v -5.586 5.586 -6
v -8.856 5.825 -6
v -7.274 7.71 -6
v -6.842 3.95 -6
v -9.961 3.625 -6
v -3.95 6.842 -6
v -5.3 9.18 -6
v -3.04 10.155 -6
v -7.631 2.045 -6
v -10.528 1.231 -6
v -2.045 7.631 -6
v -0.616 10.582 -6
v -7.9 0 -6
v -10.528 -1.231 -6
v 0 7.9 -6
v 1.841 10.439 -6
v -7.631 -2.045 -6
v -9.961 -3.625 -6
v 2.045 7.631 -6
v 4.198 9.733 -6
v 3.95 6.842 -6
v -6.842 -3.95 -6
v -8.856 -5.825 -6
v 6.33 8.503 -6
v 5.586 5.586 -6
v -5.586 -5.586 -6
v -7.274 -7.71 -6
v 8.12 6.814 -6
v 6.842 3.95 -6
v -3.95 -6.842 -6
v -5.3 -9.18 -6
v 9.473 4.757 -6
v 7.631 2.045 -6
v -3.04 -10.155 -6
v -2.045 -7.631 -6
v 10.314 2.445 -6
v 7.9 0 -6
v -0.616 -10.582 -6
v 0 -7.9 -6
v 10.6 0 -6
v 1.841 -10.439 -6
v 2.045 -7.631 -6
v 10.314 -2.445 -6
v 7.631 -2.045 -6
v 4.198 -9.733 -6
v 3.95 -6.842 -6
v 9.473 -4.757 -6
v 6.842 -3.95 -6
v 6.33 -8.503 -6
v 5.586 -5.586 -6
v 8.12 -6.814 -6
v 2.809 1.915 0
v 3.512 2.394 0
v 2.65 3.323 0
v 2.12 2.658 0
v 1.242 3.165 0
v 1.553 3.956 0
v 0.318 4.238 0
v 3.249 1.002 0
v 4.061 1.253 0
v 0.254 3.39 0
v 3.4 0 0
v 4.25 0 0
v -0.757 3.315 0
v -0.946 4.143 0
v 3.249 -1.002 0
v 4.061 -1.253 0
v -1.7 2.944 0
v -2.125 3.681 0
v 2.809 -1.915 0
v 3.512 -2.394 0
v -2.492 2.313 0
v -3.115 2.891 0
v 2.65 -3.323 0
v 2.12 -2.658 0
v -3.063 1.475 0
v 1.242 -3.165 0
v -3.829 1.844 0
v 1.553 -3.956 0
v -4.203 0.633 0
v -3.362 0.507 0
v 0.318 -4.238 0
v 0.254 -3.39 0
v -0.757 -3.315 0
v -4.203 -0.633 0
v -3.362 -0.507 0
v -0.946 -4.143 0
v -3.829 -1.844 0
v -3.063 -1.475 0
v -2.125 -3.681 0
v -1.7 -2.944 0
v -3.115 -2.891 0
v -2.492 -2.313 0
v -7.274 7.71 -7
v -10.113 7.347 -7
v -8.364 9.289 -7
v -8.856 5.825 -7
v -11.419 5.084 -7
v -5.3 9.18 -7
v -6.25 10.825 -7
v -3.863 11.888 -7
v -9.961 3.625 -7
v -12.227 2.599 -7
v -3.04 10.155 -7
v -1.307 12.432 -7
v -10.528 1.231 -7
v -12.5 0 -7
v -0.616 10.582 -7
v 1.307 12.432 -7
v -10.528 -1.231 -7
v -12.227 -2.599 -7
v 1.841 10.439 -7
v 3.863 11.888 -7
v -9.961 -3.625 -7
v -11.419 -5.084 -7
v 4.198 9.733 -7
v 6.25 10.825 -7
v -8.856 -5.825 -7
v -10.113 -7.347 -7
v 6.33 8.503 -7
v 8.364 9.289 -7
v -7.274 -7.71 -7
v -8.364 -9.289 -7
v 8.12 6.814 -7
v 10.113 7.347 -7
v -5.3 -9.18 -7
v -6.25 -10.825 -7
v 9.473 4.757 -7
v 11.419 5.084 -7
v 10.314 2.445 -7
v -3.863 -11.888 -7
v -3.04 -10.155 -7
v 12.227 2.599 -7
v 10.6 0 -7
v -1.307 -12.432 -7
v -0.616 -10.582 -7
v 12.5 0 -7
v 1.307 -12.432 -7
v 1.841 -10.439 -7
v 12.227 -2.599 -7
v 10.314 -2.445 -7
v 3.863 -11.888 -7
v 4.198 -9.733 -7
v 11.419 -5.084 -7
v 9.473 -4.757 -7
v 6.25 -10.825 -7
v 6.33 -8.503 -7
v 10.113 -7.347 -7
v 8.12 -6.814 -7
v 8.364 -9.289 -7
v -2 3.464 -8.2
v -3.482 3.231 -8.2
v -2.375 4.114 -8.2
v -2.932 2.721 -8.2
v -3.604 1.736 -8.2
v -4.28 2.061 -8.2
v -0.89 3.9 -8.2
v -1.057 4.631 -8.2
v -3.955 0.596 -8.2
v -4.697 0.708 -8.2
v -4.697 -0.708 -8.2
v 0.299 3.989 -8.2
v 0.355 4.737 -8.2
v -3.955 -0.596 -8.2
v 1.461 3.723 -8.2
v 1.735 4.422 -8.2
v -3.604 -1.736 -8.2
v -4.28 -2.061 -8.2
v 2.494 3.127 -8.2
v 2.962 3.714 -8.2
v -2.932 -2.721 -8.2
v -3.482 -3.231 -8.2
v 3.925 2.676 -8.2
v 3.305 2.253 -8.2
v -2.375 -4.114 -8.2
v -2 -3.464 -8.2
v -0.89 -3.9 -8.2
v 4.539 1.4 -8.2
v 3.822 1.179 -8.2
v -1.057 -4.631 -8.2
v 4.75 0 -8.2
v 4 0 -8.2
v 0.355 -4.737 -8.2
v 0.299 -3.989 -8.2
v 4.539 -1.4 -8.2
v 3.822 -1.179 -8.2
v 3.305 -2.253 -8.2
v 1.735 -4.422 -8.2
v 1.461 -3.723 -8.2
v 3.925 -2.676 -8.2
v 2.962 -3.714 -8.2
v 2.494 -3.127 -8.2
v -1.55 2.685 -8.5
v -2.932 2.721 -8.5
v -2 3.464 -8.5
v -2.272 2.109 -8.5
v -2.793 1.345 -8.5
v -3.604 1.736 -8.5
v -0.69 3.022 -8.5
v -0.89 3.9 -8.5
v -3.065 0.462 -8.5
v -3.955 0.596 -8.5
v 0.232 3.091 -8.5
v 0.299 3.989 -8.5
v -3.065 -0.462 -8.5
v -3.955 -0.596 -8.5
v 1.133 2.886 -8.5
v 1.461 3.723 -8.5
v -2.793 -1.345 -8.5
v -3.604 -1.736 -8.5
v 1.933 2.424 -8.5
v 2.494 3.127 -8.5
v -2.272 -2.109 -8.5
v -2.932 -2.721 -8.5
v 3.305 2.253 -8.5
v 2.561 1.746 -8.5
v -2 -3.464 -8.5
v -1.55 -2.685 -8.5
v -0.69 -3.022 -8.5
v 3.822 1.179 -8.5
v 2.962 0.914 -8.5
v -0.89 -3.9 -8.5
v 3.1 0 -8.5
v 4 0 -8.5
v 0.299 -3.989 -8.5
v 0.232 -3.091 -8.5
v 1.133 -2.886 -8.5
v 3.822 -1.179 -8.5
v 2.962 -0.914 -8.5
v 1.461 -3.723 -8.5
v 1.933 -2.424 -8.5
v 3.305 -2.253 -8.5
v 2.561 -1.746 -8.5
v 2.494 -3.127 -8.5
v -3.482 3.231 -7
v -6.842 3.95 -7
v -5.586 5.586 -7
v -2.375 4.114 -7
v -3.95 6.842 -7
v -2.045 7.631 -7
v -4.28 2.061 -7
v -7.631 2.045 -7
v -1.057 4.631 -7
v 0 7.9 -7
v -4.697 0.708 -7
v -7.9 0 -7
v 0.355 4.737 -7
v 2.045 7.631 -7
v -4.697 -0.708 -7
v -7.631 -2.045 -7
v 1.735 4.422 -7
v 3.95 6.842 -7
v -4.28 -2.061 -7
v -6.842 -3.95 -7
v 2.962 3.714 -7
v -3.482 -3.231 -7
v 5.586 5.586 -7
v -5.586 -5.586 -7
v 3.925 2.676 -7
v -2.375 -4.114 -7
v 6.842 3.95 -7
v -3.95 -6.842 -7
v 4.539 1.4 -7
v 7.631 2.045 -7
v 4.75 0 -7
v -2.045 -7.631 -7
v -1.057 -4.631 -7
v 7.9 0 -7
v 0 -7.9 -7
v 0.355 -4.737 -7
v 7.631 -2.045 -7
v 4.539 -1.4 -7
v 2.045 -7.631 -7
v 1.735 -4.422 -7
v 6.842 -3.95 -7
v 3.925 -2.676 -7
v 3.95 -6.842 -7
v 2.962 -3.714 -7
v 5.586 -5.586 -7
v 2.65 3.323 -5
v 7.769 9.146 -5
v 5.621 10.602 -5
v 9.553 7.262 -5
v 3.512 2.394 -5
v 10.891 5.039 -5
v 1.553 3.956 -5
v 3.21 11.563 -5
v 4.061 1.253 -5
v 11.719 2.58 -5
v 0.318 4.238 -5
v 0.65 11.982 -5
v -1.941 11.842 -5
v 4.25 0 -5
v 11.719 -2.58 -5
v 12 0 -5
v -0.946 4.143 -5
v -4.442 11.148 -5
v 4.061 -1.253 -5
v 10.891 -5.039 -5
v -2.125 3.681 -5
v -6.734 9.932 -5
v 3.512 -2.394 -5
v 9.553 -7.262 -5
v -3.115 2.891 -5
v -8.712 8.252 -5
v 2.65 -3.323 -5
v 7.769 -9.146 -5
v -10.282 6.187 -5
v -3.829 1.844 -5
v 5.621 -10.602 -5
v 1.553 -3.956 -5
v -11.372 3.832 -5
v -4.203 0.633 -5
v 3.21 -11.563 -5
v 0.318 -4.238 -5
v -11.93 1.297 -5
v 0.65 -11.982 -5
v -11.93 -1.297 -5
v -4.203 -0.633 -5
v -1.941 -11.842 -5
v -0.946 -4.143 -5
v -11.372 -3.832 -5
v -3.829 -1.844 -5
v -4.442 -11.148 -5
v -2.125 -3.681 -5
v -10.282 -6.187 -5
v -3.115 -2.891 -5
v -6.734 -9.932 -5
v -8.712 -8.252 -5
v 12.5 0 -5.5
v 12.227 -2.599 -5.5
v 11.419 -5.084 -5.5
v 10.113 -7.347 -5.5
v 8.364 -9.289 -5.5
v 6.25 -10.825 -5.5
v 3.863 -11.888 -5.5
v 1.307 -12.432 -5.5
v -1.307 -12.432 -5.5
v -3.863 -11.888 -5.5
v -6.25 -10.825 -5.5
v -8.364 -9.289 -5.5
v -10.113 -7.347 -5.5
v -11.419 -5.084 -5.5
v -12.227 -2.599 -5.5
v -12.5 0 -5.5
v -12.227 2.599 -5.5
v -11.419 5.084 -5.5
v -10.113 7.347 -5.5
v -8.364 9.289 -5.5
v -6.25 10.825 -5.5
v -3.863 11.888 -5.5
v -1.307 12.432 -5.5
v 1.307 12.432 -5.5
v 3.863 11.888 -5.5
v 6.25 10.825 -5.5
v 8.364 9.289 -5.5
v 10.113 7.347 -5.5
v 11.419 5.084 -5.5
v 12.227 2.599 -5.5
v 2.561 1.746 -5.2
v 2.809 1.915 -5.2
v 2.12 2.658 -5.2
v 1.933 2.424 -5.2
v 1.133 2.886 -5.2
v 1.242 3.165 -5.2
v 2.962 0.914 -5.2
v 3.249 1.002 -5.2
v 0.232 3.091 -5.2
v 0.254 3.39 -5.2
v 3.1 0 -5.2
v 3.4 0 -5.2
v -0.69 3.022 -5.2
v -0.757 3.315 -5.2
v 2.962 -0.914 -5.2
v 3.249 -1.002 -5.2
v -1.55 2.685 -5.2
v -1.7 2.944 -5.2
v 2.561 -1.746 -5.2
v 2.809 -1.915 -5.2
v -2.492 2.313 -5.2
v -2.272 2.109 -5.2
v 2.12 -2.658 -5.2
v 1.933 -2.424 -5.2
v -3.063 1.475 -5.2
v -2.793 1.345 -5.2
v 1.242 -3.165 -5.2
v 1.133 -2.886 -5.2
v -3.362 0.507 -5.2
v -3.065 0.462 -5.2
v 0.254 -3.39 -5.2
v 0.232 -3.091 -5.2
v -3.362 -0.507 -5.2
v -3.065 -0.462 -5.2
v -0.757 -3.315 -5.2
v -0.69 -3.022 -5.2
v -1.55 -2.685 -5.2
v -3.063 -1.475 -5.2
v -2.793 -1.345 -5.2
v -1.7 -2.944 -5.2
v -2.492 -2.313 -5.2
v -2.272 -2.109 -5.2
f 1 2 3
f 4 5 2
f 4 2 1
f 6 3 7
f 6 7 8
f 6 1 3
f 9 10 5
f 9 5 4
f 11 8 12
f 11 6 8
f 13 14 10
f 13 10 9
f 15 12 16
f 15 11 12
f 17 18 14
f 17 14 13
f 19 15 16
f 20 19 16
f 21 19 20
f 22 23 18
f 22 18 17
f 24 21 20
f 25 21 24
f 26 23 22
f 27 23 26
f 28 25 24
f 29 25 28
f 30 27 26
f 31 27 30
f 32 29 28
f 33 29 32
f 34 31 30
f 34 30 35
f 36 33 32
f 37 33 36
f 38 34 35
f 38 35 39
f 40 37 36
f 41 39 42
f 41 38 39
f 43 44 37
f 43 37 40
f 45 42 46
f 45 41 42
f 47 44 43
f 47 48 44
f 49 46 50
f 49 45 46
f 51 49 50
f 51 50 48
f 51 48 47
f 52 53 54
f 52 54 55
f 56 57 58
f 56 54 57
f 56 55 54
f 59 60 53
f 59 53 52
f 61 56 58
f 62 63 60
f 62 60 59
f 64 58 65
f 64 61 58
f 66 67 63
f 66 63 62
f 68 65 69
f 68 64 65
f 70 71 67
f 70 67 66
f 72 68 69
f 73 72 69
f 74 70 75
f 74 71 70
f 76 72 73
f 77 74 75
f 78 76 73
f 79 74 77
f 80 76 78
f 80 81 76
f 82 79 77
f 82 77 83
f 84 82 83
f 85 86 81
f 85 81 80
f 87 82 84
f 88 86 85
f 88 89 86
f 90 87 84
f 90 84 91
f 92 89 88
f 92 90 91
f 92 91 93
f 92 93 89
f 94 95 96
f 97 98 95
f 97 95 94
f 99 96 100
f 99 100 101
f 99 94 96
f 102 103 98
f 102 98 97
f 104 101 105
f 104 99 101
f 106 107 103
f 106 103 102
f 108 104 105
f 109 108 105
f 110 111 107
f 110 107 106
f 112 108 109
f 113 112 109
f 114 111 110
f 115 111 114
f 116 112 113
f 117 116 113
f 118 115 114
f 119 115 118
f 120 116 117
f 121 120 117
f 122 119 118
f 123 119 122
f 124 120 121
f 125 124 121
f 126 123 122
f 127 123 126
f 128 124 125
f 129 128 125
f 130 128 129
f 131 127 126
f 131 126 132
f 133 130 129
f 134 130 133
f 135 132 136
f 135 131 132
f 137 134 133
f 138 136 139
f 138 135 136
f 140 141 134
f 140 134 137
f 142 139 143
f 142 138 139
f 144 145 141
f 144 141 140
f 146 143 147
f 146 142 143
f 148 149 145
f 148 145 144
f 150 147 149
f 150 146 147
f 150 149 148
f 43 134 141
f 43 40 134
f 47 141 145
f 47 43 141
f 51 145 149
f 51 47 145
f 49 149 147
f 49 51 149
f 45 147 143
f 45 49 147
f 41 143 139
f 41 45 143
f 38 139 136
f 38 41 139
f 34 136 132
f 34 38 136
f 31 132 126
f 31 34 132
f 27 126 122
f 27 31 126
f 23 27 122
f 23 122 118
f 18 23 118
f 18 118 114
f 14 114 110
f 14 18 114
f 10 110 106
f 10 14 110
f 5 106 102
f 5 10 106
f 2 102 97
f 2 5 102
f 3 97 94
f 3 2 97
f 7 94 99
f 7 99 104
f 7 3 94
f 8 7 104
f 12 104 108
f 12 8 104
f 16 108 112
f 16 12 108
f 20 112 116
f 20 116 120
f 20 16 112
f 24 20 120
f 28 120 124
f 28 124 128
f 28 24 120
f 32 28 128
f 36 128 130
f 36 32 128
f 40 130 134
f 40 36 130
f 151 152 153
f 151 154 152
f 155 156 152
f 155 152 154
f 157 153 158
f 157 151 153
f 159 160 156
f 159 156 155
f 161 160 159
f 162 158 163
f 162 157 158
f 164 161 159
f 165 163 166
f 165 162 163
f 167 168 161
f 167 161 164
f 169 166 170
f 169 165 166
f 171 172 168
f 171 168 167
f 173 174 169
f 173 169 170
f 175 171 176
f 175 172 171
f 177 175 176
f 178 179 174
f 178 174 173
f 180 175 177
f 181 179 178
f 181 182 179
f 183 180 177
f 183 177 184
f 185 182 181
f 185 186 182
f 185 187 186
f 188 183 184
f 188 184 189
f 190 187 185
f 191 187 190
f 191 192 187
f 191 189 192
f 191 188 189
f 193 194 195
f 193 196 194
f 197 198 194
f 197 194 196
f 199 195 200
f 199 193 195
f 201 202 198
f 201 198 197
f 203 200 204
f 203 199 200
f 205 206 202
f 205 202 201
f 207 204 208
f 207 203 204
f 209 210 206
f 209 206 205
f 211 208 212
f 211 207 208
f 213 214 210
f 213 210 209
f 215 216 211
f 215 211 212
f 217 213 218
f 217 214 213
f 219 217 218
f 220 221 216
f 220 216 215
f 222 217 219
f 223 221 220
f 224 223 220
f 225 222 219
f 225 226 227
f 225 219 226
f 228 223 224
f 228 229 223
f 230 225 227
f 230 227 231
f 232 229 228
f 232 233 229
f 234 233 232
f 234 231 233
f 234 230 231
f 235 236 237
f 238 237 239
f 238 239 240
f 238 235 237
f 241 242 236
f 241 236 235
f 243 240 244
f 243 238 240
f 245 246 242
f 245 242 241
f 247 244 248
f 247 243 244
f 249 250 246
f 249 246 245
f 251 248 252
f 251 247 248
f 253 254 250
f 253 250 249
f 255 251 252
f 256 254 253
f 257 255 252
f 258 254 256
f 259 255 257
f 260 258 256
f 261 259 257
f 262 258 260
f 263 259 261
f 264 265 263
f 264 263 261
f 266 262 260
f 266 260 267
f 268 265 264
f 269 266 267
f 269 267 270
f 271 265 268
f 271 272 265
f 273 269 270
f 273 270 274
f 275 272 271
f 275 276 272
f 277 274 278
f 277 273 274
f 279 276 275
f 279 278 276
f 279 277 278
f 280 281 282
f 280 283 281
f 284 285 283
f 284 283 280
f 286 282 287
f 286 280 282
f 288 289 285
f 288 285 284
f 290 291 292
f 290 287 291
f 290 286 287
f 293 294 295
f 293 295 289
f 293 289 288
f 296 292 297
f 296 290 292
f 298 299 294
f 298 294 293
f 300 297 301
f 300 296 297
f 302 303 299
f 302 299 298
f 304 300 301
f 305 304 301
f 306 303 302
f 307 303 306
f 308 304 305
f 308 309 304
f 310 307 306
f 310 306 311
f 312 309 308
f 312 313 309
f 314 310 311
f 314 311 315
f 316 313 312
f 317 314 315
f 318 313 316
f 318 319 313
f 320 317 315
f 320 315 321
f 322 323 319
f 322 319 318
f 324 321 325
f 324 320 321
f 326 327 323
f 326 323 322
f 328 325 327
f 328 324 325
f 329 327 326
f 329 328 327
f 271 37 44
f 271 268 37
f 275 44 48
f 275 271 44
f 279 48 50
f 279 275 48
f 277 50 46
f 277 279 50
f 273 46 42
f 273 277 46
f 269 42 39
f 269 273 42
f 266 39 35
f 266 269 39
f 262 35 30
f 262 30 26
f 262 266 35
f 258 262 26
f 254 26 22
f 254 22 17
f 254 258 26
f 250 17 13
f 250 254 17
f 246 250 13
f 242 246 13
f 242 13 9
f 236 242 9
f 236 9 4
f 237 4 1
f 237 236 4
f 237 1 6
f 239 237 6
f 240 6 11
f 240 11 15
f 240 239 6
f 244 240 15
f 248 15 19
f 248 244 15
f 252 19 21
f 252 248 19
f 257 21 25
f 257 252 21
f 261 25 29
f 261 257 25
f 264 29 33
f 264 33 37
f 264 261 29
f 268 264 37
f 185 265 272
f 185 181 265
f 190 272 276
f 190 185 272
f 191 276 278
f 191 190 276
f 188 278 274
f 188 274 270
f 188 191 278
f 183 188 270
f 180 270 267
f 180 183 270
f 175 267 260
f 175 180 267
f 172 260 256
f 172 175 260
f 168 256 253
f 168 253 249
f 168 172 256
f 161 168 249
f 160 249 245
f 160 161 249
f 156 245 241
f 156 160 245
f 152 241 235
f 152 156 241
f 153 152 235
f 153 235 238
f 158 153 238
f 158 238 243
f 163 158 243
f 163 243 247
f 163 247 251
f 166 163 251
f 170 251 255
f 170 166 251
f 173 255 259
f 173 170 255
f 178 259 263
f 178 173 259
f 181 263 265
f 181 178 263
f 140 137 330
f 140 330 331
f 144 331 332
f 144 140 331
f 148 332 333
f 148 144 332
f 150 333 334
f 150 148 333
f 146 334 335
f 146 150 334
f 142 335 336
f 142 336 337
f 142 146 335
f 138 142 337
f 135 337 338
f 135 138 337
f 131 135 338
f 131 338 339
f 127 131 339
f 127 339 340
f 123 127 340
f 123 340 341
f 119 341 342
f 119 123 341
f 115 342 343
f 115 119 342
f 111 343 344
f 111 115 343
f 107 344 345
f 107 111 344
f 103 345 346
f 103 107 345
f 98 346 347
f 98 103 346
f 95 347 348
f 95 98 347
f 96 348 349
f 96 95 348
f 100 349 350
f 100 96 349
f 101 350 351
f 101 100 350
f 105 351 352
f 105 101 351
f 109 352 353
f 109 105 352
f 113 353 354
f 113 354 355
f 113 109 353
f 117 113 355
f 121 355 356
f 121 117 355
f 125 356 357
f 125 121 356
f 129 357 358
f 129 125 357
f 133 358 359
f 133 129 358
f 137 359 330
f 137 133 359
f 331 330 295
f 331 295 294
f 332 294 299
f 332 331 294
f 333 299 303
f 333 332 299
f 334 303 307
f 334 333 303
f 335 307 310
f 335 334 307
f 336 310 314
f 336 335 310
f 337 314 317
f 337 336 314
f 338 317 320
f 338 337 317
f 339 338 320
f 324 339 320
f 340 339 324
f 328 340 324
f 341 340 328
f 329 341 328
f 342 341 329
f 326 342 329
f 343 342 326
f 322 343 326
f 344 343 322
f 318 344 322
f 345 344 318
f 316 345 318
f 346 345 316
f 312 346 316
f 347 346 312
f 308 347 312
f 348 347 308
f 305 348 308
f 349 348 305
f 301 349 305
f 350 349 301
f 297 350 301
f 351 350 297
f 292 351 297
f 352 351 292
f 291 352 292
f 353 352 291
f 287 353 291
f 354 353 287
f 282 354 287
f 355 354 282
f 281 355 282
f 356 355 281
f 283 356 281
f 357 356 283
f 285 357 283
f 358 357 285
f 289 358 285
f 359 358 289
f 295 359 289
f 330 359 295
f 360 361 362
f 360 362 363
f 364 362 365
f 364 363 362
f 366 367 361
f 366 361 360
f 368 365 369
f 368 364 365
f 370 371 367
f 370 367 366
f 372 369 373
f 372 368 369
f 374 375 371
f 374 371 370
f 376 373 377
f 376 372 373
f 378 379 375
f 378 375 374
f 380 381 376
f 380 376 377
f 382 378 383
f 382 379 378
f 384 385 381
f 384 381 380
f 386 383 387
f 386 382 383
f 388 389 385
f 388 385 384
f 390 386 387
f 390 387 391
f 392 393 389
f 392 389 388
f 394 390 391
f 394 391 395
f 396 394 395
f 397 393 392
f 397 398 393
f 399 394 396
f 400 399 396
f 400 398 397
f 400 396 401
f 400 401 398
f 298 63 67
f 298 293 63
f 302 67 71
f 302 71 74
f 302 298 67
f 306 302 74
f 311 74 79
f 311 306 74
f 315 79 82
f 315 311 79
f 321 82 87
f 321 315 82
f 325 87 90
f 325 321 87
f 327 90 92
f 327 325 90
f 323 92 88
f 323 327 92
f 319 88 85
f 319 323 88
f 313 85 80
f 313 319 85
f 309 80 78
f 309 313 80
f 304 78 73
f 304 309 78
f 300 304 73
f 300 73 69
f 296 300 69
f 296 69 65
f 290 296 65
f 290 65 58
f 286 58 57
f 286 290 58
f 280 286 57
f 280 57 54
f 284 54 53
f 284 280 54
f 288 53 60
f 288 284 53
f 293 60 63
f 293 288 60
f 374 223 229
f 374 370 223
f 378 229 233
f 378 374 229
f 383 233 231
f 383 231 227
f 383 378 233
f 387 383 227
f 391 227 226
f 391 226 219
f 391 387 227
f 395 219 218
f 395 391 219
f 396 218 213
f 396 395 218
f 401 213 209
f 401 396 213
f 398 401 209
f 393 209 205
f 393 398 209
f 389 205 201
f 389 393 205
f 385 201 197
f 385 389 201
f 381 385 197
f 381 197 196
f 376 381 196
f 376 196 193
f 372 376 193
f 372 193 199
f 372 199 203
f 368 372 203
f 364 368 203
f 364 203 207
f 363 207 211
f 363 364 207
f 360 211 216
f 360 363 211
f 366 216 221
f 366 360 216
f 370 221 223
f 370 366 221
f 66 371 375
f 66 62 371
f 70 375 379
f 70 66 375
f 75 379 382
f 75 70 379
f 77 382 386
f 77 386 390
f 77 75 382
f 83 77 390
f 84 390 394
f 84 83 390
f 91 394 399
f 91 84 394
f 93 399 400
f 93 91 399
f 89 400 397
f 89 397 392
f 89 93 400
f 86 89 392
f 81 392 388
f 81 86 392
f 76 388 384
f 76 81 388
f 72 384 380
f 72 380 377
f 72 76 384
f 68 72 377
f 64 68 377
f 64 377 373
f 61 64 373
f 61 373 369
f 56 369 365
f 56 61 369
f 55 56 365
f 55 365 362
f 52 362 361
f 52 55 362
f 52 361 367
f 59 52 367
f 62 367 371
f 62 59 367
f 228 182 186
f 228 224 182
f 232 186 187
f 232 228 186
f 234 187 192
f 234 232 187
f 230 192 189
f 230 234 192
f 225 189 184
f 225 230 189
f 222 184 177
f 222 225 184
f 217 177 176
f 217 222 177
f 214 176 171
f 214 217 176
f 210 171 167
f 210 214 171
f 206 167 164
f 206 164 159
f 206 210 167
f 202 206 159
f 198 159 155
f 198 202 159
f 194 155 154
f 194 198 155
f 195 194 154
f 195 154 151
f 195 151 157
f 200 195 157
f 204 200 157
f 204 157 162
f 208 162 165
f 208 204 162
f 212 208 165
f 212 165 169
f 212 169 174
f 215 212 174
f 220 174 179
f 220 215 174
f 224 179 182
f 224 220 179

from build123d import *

# Parameters (mm, degrees)
CHAMFER1_SIZE = 0.5


with BuildPart() as part:
    # Sketch1 → Revolve1 (revolve)
    with BuildSketch(Plane(origin=(0, 0, 0), x_dir=(0, 0, -1), z_dir=(1, 0, 0)), mode=Mode.PRIVATE) as revolve1_sk:
        Polygon((0, 3.4), (0, 4.25), (5, 4.25), (5, 12.5), (7, 12.5), (7, 10.6), (6, 10.6), (6, 7.9), (7, 7.9), (7, 4.75), (8.2, 4.75), (8.2, 4), (8.5, 4), (8.5, 3.1), (5.2, 3.1), (5.2, 3.4), align=None)
    revolve(revolve1_sk.sketch.rotate(Axis((0, 0, 0), (0, 0, -1)), 90), axis=Axis((0, 0, 0), (0, 0, -1)))

    # Chamfer1
    chamfer1_edges = [part.edges().sort_by_distance(p)[0] for p in [
        (-12.5, 0, -5),
    ]]
    chamfer(chamfer1_edges, length=CHAMFER1_SIZE)


solid = part.part
